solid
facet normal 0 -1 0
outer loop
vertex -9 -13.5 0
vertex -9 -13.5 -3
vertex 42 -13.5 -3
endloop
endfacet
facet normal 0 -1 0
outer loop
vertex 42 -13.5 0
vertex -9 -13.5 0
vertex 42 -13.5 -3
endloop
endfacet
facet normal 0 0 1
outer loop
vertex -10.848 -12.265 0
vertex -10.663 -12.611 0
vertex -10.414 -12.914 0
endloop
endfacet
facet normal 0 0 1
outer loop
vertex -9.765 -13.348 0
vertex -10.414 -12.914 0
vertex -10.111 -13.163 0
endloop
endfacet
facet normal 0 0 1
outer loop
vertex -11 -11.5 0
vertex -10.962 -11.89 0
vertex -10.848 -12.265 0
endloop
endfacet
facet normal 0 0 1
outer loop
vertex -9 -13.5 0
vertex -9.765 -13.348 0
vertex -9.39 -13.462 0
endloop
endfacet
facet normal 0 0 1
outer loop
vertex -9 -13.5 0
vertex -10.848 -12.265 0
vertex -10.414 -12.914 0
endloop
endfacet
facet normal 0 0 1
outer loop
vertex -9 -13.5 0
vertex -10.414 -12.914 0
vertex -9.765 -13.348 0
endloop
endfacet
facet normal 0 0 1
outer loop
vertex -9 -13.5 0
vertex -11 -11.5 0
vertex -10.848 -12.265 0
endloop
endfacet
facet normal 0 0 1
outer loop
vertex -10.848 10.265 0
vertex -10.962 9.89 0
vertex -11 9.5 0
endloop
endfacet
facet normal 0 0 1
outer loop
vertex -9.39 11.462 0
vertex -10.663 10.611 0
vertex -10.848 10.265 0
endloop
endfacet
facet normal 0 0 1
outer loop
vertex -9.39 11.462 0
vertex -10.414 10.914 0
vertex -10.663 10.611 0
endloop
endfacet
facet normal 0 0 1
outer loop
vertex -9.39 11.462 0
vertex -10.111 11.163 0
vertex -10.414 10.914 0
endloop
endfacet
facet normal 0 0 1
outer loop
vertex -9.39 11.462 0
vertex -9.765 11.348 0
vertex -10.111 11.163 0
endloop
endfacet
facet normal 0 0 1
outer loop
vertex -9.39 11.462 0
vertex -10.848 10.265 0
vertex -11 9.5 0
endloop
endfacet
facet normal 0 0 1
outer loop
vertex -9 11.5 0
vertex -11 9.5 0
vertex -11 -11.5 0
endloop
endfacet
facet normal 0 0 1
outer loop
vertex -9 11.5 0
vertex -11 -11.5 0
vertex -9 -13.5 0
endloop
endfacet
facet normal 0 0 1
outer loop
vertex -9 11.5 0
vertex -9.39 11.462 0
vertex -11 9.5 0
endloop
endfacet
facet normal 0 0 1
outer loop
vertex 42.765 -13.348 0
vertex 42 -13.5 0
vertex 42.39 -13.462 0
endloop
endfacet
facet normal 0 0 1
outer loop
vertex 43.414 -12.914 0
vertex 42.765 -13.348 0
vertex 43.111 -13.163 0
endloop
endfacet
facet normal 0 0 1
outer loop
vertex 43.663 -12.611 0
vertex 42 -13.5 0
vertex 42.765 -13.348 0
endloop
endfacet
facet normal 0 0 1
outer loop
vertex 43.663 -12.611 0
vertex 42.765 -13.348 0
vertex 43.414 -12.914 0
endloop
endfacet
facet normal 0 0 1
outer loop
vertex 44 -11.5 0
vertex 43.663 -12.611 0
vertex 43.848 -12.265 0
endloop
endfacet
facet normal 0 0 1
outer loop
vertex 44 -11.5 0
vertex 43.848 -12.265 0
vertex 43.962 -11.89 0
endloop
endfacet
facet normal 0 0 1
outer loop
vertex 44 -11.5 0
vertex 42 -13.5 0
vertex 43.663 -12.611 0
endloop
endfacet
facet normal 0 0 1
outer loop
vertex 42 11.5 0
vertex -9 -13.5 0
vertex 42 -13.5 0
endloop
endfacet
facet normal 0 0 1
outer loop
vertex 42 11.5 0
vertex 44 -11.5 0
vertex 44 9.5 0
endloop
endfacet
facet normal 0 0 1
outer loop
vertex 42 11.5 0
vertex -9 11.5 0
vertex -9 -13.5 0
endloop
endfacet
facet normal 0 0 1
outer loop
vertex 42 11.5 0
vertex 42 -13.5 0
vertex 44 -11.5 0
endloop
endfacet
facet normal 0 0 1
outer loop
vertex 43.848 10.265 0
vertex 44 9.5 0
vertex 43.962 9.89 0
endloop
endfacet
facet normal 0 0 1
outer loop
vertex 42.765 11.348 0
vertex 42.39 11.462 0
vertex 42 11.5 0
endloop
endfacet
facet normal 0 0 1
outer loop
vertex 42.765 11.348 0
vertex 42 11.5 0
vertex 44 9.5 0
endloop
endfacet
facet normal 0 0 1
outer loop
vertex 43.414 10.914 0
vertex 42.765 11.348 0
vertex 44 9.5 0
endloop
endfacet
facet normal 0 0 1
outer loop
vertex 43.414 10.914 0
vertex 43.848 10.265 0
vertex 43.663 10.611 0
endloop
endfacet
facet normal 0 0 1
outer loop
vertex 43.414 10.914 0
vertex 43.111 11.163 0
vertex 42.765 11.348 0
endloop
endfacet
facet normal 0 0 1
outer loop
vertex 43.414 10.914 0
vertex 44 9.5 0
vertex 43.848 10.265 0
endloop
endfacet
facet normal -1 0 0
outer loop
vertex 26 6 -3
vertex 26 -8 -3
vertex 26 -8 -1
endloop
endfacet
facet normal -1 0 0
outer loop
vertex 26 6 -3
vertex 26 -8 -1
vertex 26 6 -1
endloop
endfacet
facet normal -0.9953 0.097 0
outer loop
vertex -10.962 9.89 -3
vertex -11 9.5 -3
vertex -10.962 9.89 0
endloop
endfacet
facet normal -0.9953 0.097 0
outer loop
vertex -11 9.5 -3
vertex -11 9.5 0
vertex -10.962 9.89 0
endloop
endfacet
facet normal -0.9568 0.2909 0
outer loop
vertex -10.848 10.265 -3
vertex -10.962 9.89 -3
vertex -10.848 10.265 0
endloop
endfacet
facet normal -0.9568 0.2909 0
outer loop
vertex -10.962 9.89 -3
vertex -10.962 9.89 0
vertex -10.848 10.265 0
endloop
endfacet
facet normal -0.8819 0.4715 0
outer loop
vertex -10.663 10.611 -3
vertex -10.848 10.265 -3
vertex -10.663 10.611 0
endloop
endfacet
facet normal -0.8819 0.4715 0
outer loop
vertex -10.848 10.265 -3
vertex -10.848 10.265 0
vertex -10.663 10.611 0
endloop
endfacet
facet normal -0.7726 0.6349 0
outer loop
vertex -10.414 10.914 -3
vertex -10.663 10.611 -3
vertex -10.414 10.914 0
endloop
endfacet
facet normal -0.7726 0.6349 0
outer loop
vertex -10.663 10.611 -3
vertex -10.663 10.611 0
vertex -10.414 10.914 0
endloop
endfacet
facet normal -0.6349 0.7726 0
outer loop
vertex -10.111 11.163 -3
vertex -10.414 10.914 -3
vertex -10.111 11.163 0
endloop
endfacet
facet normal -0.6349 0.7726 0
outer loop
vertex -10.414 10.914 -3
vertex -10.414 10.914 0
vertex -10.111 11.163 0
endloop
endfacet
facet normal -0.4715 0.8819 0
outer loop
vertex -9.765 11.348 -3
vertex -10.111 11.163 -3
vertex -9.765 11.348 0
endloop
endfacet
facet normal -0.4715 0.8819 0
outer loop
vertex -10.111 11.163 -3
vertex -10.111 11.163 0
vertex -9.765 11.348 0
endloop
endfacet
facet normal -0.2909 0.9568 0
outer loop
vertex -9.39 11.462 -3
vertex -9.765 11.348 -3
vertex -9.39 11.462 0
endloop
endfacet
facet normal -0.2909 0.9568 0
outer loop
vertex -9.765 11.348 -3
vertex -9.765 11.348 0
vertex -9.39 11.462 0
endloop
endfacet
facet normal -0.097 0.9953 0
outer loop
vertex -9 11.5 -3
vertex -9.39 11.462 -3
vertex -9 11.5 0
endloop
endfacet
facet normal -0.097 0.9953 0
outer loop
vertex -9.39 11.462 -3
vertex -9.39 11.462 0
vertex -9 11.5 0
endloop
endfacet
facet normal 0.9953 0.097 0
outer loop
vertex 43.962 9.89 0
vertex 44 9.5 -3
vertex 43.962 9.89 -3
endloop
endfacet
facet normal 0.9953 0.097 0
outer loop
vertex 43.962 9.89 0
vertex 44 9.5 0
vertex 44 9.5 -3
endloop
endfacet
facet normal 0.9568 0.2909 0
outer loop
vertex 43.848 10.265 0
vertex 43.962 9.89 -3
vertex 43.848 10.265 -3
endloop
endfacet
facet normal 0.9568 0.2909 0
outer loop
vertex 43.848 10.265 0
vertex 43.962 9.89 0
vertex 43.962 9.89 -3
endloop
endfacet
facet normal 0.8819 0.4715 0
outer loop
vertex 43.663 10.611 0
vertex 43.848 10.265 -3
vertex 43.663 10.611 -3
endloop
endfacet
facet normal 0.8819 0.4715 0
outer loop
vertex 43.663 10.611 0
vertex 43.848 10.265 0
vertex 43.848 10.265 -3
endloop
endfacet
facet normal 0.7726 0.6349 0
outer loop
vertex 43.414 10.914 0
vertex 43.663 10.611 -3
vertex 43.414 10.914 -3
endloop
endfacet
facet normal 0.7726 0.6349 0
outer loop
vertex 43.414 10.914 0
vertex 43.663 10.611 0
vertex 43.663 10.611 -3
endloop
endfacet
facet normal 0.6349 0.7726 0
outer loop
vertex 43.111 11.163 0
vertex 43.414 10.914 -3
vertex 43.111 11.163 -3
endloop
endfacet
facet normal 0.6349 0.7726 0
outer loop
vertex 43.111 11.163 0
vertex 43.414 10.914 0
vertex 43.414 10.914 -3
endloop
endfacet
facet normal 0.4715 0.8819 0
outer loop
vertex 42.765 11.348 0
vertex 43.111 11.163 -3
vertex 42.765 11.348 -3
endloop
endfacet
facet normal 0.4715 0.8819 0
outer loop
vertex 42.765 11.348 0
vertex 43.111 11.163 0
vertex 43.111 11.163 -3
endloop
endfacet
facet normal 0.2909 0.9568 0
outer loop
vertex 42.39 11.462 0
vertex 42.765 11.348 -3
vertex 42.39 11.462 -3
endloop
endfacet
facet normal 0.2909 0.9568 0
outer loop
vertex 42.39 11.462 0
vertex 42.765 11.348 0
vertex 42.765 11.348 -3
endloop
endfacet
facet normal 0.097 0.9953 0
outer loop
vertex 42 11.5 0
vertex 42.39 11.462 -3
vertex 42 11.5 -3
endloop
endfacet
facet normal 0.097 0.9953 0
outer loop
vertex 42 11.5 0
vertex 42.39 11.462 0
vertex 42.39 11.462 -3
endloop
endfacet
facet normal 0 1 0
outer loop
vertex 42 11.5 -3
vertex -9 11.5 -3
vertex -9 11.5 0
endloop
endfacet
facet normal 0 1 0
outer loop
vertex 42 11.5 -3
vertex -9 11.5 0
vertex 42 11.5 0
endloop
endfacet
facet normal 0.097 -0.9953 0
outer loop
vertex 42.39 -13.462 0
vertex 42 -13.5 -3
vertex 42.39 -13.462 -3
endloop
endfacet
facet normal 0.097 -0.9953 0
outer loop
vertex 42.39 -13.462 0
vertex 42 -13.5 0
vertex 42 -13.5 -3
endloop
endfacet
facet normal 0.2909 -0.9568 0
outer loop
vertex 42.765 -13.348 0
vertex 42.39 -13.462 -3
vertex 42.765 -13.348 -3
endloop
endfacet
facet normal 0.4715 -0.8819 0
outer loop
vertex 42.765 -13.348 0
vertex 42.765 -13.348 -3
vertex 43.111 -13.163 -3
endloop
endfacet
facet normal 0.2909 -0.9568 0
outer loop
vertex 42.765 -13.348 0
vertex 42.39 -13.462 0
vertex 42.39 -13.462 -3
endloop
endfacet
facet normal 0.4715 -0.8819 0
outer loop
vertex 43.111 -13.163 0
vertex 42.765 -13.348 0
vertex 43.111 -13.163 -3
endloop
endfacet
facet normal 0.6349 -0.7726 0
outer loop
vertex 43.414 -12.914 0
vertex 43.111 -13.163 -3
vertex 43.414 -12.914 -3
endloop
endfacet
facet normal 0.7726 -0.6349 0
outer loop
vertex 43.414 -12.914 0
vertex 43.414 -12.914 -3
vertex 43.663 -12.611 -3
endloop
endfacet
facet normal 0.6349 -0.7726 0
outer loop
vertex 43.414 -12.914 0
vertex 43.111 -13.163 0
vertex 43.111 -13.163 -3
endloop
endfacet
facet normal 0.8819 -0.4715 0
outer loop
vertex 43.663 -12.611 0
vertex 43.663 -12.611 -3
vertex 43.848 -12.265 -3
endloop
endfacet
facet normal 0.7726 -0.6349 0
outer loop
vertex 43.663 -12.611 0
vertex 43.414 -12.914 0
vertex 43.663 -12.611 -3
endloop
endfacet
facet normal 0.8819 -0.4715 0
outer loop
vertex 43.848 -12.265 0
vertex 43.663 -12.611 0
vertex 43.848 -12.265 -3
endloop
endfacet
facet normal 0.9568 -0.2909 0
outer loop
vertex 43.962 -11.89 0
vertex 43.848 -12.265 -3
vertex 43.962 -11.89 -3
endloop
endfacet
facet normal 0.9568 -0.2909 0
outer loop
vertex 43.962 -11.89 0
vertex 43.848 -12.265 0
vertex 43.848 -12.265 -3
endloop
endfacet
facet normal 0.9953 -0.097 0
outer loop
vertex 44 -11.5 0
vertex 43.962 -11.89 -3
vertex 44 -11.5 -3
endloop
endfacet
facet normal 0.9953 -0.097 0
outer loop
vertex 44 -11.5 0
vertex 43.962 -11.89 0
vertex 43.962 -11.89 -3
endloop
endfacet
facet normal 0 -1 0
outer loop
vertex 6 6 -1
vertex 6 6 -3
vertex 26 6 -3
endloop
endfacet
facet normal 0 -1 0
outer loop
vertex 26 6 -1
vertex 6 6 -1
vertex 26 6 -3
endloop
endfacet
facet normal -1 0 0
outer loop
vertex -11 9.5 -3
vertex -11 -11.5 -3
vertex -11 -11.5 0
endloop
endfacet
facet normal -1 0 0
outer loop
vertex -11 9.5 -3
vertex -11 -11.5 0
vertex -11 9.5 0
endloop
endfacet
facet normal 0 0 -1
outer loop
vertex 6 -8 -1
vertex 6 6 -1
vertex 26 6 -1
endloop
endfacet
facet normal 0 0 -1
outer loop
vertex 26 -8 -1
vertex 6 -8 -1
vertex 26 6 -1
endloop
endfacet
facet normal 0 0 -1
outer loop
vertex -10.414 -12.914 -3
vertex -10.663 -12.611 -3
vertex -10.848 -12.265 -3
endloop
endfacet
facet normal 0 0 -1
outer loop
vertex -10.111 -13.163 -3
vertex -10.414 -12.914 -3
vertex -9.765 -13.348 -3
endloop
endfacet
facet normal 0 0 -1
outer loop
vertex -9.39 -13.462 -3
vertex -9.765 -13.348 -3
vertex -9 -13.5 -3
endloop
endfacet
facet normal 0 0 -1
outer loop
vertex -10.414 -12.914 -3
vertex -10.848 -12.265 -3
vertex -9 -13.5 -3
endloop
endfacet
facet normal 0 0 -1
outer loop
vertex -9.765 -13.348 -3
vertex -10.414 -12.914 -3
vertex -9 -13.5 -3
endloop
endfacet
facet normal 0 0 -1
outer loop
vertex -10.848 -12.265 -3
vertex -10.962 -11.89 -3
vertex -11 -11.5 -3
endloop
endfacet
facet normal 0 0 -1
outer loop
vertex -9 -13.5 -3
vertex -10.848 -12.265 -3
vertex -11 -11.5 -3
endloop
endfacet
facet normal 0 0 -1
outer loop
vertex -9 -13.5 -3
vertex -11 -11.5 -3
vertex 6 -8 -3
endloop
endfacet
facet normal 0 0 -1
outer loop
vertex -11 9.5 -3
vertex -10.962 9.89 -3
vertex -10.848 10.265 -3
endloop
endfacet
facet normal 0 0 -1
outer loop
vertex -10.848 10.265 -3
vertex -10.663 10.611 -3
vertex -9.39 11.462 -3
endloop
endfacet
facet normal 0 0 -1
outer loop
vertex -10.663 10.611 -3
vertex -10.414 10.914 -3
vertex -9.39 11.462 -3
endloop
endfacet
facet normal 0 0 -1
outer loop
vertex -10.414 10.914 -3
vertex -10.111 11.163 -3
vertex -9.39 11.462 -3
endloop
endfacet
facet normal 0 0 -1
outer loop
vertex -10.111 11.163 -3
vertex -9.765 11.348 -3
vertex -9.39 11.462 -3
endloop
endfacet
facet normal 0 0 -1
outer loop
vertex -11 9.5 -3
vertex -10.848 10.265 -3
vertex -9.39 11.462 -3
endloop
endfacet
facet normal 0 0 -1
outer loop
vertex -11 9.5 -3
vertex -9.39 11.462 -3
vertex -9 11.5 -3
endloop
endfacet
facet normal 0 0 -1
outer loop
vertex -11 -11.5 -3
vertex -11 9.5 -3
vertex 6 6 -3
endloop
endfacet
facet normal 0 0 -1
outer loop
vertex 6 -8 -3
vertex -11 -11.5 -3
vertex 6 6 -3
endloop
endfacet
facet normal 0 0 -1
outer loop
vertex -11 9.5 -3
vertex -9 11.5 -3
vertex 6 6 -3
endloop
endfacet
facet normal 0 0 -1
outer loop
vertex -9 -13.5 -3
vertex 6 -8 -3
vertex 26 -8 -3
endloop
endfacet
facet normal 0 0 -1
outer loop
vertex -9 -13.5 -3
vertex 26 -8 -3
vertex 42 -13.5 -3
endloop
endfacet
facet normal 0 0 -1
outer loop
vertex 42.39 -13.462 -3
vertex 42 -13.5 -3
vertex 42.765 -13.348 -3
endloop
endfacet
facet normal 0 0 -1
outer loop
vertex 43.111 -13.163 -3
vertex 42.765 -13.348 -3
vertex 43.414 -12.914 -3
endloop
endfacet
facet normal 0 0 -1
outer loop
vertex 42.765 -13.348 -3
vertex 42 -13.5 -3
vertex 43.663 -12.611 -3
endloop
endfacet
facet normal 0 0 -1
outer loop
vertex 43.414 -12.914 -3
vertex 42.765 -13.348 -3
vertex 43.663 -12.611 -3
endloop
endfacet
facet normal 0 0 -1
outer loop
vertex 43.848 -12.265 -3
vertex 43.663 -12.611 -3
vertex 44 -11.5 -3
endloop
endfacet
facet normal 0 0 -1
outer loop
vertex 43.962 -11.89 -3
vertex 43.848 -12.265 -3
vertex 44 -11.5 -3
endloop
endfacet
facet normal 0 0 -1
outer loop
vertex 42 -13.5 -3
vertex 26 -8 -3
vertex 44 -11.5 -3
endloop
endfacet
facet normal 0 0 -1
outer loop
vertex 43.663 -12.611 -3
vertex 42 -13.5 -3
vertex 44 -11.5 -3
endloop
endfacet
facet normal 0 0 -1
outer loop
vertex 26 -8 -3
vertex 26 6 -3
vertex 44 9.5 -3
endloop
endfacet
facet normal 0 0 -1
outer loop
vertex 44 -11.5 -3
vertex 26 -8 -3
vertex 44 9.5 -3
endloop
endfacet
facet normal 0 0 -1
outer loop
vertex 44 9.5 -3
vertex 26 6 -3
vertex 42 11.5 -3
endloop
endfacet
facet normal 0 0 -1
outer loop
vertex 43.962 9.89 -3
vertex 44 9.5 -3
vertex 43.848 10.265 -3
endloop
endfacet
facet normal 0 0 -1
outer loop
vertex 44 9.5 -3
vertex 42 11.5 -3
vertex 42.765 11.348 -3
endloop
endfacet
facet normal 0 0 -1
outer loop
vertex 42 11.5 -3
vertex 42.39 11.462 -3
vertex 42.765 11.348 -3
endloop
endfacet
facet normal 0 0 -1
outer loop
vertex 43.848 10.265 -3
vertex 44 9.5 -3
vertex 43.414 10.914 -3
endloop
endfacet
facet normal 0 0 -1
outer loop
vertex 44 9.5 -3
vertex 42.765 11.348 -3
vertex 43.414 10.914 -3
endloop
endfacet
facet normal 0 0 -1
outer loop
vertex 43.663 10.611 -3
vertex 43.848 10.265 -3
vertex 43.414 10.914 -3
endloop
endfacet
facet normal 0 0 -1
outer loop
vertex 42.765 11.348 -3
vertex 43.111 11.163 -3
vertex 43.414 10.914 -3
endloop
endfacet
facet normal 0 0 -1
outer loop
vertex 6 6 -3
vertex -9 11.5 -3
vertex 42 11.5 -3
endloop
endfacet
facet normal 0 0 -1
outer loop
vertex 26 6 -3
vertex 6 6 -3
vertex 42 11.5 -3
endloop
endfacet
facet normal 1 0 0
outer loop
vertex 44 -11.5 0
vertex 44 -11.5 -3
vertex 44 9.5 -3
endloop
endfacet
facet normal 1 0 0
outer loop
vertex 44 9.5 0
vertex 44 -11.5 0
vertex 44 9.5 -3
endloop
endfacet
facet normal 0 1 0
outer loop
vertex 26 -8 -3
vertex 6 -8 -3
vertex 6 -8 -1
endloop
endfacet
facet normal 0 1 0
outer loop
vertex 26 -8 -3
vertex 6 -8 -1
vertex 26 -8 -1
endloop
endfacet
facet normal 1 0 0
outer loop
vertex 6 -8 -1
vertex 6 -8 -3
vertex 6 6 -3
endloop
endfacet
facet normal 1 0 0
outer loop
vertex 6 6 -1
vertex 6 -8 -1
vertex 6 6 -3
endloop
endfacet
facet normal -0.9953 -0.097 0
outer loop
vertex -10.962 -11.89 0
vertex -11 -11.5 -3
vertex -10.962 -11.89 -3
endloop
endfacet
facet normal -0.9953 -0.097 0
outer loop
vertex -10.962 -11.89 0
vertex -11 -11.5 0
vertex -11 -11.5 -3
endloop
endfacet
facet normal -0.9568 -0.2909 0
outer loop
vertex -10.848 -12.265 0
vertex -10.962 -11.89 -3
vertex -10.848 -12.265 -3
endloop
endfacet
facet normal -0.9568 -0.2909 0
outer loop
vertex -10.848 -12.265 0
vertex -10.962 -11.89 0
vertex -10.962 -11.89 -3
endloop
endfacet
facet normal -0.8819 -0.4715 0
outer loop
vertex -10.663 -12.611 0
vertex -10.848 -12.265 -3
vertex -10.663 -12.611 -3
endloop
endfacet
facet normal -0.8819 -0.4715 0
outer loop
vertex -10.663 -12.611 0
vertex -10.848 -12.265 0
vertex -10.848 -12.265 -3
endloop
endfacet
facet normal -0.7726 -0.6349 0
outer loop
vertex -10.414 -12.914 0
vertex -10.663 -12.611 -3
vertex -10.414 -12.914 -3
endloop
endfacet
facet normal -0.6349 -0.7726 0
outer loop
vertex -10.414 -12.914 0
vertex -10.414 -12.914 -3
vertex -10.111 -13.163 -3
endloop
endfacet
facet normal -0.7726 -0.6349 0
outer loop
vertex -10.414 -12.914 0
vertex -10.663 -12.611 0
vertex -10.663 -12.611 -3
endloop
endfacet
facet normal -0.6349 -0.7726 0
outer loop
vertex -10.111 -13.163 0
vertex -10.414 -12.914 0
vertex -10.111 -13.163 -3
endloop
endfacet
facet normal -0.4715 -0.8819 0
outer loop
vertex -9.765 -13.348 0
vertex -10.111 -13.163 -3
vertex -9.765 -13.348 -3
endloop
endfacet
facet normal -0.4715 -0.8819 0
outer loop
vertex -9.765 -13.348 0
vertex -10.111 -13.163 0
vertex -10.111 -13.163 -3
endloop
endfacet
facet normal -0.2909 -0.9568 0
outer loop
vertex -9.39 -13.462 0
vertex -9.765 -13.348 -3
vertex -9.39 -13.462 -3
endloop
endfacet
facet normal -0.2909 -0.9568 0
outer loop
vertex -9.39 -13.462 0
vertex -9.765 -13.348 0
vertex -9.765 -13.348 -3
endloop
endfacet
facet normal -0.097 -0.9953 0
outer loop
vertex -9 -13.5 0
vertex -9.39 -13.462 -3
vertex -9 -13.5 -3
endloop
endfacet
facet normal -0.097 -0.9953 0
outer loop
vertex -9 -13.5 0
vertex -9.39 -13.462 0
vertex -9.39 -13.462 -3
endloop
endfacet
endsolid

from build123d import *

# Parameters (mm, degrees)
BOX001_W     = 20
BOX001_H     = 14
BOX001_DEPTH = 2
BOX_W        = 55
BOX_H        = 25
BOX_DEPTH    = 3
FILLET_R     = 2


with BuildPart() as cube001:
    # Box001 → Box001 (new body)
    with BuildSketch(Plane(origin=(6, -8, -3), x_dir=(1, 0, 0), z_dir=(0, 0, 1))):
        with Locations((10, 7)):
            Rectangle(BOX001_W, BOX001_H)
    extrude(amount=BOX001_DEPTH)


with BuildPart() as cut:
    # Box → Box (new body)
    with BuildSketch(Plane(origin=(-11, -13.5, -3), x_dir=(1, 0, 0), z_dir=(0, 0, 1))):
        with Locations((27.5, 12.5)):
            Rectangle(BOX_W, BOX_H)
    extrude(amount=BOX_DEPTH)

    # Fillet
    fillet_edges = [cut.edges().sort_by_distance(p)[0] for p in [
        (-11, -13.5, -1.5),
        (-11, 11.5, -1.5),
        (44, -13.5, -1.5),
        (44, 11.5, -1.5),
    ]]
    fillet(fillet_edges, radius=FILLET_R)

    # Cut: cut Cube001
    add(cube001.part, mode=Mode.SUBTRACT)


solid = cut.part
